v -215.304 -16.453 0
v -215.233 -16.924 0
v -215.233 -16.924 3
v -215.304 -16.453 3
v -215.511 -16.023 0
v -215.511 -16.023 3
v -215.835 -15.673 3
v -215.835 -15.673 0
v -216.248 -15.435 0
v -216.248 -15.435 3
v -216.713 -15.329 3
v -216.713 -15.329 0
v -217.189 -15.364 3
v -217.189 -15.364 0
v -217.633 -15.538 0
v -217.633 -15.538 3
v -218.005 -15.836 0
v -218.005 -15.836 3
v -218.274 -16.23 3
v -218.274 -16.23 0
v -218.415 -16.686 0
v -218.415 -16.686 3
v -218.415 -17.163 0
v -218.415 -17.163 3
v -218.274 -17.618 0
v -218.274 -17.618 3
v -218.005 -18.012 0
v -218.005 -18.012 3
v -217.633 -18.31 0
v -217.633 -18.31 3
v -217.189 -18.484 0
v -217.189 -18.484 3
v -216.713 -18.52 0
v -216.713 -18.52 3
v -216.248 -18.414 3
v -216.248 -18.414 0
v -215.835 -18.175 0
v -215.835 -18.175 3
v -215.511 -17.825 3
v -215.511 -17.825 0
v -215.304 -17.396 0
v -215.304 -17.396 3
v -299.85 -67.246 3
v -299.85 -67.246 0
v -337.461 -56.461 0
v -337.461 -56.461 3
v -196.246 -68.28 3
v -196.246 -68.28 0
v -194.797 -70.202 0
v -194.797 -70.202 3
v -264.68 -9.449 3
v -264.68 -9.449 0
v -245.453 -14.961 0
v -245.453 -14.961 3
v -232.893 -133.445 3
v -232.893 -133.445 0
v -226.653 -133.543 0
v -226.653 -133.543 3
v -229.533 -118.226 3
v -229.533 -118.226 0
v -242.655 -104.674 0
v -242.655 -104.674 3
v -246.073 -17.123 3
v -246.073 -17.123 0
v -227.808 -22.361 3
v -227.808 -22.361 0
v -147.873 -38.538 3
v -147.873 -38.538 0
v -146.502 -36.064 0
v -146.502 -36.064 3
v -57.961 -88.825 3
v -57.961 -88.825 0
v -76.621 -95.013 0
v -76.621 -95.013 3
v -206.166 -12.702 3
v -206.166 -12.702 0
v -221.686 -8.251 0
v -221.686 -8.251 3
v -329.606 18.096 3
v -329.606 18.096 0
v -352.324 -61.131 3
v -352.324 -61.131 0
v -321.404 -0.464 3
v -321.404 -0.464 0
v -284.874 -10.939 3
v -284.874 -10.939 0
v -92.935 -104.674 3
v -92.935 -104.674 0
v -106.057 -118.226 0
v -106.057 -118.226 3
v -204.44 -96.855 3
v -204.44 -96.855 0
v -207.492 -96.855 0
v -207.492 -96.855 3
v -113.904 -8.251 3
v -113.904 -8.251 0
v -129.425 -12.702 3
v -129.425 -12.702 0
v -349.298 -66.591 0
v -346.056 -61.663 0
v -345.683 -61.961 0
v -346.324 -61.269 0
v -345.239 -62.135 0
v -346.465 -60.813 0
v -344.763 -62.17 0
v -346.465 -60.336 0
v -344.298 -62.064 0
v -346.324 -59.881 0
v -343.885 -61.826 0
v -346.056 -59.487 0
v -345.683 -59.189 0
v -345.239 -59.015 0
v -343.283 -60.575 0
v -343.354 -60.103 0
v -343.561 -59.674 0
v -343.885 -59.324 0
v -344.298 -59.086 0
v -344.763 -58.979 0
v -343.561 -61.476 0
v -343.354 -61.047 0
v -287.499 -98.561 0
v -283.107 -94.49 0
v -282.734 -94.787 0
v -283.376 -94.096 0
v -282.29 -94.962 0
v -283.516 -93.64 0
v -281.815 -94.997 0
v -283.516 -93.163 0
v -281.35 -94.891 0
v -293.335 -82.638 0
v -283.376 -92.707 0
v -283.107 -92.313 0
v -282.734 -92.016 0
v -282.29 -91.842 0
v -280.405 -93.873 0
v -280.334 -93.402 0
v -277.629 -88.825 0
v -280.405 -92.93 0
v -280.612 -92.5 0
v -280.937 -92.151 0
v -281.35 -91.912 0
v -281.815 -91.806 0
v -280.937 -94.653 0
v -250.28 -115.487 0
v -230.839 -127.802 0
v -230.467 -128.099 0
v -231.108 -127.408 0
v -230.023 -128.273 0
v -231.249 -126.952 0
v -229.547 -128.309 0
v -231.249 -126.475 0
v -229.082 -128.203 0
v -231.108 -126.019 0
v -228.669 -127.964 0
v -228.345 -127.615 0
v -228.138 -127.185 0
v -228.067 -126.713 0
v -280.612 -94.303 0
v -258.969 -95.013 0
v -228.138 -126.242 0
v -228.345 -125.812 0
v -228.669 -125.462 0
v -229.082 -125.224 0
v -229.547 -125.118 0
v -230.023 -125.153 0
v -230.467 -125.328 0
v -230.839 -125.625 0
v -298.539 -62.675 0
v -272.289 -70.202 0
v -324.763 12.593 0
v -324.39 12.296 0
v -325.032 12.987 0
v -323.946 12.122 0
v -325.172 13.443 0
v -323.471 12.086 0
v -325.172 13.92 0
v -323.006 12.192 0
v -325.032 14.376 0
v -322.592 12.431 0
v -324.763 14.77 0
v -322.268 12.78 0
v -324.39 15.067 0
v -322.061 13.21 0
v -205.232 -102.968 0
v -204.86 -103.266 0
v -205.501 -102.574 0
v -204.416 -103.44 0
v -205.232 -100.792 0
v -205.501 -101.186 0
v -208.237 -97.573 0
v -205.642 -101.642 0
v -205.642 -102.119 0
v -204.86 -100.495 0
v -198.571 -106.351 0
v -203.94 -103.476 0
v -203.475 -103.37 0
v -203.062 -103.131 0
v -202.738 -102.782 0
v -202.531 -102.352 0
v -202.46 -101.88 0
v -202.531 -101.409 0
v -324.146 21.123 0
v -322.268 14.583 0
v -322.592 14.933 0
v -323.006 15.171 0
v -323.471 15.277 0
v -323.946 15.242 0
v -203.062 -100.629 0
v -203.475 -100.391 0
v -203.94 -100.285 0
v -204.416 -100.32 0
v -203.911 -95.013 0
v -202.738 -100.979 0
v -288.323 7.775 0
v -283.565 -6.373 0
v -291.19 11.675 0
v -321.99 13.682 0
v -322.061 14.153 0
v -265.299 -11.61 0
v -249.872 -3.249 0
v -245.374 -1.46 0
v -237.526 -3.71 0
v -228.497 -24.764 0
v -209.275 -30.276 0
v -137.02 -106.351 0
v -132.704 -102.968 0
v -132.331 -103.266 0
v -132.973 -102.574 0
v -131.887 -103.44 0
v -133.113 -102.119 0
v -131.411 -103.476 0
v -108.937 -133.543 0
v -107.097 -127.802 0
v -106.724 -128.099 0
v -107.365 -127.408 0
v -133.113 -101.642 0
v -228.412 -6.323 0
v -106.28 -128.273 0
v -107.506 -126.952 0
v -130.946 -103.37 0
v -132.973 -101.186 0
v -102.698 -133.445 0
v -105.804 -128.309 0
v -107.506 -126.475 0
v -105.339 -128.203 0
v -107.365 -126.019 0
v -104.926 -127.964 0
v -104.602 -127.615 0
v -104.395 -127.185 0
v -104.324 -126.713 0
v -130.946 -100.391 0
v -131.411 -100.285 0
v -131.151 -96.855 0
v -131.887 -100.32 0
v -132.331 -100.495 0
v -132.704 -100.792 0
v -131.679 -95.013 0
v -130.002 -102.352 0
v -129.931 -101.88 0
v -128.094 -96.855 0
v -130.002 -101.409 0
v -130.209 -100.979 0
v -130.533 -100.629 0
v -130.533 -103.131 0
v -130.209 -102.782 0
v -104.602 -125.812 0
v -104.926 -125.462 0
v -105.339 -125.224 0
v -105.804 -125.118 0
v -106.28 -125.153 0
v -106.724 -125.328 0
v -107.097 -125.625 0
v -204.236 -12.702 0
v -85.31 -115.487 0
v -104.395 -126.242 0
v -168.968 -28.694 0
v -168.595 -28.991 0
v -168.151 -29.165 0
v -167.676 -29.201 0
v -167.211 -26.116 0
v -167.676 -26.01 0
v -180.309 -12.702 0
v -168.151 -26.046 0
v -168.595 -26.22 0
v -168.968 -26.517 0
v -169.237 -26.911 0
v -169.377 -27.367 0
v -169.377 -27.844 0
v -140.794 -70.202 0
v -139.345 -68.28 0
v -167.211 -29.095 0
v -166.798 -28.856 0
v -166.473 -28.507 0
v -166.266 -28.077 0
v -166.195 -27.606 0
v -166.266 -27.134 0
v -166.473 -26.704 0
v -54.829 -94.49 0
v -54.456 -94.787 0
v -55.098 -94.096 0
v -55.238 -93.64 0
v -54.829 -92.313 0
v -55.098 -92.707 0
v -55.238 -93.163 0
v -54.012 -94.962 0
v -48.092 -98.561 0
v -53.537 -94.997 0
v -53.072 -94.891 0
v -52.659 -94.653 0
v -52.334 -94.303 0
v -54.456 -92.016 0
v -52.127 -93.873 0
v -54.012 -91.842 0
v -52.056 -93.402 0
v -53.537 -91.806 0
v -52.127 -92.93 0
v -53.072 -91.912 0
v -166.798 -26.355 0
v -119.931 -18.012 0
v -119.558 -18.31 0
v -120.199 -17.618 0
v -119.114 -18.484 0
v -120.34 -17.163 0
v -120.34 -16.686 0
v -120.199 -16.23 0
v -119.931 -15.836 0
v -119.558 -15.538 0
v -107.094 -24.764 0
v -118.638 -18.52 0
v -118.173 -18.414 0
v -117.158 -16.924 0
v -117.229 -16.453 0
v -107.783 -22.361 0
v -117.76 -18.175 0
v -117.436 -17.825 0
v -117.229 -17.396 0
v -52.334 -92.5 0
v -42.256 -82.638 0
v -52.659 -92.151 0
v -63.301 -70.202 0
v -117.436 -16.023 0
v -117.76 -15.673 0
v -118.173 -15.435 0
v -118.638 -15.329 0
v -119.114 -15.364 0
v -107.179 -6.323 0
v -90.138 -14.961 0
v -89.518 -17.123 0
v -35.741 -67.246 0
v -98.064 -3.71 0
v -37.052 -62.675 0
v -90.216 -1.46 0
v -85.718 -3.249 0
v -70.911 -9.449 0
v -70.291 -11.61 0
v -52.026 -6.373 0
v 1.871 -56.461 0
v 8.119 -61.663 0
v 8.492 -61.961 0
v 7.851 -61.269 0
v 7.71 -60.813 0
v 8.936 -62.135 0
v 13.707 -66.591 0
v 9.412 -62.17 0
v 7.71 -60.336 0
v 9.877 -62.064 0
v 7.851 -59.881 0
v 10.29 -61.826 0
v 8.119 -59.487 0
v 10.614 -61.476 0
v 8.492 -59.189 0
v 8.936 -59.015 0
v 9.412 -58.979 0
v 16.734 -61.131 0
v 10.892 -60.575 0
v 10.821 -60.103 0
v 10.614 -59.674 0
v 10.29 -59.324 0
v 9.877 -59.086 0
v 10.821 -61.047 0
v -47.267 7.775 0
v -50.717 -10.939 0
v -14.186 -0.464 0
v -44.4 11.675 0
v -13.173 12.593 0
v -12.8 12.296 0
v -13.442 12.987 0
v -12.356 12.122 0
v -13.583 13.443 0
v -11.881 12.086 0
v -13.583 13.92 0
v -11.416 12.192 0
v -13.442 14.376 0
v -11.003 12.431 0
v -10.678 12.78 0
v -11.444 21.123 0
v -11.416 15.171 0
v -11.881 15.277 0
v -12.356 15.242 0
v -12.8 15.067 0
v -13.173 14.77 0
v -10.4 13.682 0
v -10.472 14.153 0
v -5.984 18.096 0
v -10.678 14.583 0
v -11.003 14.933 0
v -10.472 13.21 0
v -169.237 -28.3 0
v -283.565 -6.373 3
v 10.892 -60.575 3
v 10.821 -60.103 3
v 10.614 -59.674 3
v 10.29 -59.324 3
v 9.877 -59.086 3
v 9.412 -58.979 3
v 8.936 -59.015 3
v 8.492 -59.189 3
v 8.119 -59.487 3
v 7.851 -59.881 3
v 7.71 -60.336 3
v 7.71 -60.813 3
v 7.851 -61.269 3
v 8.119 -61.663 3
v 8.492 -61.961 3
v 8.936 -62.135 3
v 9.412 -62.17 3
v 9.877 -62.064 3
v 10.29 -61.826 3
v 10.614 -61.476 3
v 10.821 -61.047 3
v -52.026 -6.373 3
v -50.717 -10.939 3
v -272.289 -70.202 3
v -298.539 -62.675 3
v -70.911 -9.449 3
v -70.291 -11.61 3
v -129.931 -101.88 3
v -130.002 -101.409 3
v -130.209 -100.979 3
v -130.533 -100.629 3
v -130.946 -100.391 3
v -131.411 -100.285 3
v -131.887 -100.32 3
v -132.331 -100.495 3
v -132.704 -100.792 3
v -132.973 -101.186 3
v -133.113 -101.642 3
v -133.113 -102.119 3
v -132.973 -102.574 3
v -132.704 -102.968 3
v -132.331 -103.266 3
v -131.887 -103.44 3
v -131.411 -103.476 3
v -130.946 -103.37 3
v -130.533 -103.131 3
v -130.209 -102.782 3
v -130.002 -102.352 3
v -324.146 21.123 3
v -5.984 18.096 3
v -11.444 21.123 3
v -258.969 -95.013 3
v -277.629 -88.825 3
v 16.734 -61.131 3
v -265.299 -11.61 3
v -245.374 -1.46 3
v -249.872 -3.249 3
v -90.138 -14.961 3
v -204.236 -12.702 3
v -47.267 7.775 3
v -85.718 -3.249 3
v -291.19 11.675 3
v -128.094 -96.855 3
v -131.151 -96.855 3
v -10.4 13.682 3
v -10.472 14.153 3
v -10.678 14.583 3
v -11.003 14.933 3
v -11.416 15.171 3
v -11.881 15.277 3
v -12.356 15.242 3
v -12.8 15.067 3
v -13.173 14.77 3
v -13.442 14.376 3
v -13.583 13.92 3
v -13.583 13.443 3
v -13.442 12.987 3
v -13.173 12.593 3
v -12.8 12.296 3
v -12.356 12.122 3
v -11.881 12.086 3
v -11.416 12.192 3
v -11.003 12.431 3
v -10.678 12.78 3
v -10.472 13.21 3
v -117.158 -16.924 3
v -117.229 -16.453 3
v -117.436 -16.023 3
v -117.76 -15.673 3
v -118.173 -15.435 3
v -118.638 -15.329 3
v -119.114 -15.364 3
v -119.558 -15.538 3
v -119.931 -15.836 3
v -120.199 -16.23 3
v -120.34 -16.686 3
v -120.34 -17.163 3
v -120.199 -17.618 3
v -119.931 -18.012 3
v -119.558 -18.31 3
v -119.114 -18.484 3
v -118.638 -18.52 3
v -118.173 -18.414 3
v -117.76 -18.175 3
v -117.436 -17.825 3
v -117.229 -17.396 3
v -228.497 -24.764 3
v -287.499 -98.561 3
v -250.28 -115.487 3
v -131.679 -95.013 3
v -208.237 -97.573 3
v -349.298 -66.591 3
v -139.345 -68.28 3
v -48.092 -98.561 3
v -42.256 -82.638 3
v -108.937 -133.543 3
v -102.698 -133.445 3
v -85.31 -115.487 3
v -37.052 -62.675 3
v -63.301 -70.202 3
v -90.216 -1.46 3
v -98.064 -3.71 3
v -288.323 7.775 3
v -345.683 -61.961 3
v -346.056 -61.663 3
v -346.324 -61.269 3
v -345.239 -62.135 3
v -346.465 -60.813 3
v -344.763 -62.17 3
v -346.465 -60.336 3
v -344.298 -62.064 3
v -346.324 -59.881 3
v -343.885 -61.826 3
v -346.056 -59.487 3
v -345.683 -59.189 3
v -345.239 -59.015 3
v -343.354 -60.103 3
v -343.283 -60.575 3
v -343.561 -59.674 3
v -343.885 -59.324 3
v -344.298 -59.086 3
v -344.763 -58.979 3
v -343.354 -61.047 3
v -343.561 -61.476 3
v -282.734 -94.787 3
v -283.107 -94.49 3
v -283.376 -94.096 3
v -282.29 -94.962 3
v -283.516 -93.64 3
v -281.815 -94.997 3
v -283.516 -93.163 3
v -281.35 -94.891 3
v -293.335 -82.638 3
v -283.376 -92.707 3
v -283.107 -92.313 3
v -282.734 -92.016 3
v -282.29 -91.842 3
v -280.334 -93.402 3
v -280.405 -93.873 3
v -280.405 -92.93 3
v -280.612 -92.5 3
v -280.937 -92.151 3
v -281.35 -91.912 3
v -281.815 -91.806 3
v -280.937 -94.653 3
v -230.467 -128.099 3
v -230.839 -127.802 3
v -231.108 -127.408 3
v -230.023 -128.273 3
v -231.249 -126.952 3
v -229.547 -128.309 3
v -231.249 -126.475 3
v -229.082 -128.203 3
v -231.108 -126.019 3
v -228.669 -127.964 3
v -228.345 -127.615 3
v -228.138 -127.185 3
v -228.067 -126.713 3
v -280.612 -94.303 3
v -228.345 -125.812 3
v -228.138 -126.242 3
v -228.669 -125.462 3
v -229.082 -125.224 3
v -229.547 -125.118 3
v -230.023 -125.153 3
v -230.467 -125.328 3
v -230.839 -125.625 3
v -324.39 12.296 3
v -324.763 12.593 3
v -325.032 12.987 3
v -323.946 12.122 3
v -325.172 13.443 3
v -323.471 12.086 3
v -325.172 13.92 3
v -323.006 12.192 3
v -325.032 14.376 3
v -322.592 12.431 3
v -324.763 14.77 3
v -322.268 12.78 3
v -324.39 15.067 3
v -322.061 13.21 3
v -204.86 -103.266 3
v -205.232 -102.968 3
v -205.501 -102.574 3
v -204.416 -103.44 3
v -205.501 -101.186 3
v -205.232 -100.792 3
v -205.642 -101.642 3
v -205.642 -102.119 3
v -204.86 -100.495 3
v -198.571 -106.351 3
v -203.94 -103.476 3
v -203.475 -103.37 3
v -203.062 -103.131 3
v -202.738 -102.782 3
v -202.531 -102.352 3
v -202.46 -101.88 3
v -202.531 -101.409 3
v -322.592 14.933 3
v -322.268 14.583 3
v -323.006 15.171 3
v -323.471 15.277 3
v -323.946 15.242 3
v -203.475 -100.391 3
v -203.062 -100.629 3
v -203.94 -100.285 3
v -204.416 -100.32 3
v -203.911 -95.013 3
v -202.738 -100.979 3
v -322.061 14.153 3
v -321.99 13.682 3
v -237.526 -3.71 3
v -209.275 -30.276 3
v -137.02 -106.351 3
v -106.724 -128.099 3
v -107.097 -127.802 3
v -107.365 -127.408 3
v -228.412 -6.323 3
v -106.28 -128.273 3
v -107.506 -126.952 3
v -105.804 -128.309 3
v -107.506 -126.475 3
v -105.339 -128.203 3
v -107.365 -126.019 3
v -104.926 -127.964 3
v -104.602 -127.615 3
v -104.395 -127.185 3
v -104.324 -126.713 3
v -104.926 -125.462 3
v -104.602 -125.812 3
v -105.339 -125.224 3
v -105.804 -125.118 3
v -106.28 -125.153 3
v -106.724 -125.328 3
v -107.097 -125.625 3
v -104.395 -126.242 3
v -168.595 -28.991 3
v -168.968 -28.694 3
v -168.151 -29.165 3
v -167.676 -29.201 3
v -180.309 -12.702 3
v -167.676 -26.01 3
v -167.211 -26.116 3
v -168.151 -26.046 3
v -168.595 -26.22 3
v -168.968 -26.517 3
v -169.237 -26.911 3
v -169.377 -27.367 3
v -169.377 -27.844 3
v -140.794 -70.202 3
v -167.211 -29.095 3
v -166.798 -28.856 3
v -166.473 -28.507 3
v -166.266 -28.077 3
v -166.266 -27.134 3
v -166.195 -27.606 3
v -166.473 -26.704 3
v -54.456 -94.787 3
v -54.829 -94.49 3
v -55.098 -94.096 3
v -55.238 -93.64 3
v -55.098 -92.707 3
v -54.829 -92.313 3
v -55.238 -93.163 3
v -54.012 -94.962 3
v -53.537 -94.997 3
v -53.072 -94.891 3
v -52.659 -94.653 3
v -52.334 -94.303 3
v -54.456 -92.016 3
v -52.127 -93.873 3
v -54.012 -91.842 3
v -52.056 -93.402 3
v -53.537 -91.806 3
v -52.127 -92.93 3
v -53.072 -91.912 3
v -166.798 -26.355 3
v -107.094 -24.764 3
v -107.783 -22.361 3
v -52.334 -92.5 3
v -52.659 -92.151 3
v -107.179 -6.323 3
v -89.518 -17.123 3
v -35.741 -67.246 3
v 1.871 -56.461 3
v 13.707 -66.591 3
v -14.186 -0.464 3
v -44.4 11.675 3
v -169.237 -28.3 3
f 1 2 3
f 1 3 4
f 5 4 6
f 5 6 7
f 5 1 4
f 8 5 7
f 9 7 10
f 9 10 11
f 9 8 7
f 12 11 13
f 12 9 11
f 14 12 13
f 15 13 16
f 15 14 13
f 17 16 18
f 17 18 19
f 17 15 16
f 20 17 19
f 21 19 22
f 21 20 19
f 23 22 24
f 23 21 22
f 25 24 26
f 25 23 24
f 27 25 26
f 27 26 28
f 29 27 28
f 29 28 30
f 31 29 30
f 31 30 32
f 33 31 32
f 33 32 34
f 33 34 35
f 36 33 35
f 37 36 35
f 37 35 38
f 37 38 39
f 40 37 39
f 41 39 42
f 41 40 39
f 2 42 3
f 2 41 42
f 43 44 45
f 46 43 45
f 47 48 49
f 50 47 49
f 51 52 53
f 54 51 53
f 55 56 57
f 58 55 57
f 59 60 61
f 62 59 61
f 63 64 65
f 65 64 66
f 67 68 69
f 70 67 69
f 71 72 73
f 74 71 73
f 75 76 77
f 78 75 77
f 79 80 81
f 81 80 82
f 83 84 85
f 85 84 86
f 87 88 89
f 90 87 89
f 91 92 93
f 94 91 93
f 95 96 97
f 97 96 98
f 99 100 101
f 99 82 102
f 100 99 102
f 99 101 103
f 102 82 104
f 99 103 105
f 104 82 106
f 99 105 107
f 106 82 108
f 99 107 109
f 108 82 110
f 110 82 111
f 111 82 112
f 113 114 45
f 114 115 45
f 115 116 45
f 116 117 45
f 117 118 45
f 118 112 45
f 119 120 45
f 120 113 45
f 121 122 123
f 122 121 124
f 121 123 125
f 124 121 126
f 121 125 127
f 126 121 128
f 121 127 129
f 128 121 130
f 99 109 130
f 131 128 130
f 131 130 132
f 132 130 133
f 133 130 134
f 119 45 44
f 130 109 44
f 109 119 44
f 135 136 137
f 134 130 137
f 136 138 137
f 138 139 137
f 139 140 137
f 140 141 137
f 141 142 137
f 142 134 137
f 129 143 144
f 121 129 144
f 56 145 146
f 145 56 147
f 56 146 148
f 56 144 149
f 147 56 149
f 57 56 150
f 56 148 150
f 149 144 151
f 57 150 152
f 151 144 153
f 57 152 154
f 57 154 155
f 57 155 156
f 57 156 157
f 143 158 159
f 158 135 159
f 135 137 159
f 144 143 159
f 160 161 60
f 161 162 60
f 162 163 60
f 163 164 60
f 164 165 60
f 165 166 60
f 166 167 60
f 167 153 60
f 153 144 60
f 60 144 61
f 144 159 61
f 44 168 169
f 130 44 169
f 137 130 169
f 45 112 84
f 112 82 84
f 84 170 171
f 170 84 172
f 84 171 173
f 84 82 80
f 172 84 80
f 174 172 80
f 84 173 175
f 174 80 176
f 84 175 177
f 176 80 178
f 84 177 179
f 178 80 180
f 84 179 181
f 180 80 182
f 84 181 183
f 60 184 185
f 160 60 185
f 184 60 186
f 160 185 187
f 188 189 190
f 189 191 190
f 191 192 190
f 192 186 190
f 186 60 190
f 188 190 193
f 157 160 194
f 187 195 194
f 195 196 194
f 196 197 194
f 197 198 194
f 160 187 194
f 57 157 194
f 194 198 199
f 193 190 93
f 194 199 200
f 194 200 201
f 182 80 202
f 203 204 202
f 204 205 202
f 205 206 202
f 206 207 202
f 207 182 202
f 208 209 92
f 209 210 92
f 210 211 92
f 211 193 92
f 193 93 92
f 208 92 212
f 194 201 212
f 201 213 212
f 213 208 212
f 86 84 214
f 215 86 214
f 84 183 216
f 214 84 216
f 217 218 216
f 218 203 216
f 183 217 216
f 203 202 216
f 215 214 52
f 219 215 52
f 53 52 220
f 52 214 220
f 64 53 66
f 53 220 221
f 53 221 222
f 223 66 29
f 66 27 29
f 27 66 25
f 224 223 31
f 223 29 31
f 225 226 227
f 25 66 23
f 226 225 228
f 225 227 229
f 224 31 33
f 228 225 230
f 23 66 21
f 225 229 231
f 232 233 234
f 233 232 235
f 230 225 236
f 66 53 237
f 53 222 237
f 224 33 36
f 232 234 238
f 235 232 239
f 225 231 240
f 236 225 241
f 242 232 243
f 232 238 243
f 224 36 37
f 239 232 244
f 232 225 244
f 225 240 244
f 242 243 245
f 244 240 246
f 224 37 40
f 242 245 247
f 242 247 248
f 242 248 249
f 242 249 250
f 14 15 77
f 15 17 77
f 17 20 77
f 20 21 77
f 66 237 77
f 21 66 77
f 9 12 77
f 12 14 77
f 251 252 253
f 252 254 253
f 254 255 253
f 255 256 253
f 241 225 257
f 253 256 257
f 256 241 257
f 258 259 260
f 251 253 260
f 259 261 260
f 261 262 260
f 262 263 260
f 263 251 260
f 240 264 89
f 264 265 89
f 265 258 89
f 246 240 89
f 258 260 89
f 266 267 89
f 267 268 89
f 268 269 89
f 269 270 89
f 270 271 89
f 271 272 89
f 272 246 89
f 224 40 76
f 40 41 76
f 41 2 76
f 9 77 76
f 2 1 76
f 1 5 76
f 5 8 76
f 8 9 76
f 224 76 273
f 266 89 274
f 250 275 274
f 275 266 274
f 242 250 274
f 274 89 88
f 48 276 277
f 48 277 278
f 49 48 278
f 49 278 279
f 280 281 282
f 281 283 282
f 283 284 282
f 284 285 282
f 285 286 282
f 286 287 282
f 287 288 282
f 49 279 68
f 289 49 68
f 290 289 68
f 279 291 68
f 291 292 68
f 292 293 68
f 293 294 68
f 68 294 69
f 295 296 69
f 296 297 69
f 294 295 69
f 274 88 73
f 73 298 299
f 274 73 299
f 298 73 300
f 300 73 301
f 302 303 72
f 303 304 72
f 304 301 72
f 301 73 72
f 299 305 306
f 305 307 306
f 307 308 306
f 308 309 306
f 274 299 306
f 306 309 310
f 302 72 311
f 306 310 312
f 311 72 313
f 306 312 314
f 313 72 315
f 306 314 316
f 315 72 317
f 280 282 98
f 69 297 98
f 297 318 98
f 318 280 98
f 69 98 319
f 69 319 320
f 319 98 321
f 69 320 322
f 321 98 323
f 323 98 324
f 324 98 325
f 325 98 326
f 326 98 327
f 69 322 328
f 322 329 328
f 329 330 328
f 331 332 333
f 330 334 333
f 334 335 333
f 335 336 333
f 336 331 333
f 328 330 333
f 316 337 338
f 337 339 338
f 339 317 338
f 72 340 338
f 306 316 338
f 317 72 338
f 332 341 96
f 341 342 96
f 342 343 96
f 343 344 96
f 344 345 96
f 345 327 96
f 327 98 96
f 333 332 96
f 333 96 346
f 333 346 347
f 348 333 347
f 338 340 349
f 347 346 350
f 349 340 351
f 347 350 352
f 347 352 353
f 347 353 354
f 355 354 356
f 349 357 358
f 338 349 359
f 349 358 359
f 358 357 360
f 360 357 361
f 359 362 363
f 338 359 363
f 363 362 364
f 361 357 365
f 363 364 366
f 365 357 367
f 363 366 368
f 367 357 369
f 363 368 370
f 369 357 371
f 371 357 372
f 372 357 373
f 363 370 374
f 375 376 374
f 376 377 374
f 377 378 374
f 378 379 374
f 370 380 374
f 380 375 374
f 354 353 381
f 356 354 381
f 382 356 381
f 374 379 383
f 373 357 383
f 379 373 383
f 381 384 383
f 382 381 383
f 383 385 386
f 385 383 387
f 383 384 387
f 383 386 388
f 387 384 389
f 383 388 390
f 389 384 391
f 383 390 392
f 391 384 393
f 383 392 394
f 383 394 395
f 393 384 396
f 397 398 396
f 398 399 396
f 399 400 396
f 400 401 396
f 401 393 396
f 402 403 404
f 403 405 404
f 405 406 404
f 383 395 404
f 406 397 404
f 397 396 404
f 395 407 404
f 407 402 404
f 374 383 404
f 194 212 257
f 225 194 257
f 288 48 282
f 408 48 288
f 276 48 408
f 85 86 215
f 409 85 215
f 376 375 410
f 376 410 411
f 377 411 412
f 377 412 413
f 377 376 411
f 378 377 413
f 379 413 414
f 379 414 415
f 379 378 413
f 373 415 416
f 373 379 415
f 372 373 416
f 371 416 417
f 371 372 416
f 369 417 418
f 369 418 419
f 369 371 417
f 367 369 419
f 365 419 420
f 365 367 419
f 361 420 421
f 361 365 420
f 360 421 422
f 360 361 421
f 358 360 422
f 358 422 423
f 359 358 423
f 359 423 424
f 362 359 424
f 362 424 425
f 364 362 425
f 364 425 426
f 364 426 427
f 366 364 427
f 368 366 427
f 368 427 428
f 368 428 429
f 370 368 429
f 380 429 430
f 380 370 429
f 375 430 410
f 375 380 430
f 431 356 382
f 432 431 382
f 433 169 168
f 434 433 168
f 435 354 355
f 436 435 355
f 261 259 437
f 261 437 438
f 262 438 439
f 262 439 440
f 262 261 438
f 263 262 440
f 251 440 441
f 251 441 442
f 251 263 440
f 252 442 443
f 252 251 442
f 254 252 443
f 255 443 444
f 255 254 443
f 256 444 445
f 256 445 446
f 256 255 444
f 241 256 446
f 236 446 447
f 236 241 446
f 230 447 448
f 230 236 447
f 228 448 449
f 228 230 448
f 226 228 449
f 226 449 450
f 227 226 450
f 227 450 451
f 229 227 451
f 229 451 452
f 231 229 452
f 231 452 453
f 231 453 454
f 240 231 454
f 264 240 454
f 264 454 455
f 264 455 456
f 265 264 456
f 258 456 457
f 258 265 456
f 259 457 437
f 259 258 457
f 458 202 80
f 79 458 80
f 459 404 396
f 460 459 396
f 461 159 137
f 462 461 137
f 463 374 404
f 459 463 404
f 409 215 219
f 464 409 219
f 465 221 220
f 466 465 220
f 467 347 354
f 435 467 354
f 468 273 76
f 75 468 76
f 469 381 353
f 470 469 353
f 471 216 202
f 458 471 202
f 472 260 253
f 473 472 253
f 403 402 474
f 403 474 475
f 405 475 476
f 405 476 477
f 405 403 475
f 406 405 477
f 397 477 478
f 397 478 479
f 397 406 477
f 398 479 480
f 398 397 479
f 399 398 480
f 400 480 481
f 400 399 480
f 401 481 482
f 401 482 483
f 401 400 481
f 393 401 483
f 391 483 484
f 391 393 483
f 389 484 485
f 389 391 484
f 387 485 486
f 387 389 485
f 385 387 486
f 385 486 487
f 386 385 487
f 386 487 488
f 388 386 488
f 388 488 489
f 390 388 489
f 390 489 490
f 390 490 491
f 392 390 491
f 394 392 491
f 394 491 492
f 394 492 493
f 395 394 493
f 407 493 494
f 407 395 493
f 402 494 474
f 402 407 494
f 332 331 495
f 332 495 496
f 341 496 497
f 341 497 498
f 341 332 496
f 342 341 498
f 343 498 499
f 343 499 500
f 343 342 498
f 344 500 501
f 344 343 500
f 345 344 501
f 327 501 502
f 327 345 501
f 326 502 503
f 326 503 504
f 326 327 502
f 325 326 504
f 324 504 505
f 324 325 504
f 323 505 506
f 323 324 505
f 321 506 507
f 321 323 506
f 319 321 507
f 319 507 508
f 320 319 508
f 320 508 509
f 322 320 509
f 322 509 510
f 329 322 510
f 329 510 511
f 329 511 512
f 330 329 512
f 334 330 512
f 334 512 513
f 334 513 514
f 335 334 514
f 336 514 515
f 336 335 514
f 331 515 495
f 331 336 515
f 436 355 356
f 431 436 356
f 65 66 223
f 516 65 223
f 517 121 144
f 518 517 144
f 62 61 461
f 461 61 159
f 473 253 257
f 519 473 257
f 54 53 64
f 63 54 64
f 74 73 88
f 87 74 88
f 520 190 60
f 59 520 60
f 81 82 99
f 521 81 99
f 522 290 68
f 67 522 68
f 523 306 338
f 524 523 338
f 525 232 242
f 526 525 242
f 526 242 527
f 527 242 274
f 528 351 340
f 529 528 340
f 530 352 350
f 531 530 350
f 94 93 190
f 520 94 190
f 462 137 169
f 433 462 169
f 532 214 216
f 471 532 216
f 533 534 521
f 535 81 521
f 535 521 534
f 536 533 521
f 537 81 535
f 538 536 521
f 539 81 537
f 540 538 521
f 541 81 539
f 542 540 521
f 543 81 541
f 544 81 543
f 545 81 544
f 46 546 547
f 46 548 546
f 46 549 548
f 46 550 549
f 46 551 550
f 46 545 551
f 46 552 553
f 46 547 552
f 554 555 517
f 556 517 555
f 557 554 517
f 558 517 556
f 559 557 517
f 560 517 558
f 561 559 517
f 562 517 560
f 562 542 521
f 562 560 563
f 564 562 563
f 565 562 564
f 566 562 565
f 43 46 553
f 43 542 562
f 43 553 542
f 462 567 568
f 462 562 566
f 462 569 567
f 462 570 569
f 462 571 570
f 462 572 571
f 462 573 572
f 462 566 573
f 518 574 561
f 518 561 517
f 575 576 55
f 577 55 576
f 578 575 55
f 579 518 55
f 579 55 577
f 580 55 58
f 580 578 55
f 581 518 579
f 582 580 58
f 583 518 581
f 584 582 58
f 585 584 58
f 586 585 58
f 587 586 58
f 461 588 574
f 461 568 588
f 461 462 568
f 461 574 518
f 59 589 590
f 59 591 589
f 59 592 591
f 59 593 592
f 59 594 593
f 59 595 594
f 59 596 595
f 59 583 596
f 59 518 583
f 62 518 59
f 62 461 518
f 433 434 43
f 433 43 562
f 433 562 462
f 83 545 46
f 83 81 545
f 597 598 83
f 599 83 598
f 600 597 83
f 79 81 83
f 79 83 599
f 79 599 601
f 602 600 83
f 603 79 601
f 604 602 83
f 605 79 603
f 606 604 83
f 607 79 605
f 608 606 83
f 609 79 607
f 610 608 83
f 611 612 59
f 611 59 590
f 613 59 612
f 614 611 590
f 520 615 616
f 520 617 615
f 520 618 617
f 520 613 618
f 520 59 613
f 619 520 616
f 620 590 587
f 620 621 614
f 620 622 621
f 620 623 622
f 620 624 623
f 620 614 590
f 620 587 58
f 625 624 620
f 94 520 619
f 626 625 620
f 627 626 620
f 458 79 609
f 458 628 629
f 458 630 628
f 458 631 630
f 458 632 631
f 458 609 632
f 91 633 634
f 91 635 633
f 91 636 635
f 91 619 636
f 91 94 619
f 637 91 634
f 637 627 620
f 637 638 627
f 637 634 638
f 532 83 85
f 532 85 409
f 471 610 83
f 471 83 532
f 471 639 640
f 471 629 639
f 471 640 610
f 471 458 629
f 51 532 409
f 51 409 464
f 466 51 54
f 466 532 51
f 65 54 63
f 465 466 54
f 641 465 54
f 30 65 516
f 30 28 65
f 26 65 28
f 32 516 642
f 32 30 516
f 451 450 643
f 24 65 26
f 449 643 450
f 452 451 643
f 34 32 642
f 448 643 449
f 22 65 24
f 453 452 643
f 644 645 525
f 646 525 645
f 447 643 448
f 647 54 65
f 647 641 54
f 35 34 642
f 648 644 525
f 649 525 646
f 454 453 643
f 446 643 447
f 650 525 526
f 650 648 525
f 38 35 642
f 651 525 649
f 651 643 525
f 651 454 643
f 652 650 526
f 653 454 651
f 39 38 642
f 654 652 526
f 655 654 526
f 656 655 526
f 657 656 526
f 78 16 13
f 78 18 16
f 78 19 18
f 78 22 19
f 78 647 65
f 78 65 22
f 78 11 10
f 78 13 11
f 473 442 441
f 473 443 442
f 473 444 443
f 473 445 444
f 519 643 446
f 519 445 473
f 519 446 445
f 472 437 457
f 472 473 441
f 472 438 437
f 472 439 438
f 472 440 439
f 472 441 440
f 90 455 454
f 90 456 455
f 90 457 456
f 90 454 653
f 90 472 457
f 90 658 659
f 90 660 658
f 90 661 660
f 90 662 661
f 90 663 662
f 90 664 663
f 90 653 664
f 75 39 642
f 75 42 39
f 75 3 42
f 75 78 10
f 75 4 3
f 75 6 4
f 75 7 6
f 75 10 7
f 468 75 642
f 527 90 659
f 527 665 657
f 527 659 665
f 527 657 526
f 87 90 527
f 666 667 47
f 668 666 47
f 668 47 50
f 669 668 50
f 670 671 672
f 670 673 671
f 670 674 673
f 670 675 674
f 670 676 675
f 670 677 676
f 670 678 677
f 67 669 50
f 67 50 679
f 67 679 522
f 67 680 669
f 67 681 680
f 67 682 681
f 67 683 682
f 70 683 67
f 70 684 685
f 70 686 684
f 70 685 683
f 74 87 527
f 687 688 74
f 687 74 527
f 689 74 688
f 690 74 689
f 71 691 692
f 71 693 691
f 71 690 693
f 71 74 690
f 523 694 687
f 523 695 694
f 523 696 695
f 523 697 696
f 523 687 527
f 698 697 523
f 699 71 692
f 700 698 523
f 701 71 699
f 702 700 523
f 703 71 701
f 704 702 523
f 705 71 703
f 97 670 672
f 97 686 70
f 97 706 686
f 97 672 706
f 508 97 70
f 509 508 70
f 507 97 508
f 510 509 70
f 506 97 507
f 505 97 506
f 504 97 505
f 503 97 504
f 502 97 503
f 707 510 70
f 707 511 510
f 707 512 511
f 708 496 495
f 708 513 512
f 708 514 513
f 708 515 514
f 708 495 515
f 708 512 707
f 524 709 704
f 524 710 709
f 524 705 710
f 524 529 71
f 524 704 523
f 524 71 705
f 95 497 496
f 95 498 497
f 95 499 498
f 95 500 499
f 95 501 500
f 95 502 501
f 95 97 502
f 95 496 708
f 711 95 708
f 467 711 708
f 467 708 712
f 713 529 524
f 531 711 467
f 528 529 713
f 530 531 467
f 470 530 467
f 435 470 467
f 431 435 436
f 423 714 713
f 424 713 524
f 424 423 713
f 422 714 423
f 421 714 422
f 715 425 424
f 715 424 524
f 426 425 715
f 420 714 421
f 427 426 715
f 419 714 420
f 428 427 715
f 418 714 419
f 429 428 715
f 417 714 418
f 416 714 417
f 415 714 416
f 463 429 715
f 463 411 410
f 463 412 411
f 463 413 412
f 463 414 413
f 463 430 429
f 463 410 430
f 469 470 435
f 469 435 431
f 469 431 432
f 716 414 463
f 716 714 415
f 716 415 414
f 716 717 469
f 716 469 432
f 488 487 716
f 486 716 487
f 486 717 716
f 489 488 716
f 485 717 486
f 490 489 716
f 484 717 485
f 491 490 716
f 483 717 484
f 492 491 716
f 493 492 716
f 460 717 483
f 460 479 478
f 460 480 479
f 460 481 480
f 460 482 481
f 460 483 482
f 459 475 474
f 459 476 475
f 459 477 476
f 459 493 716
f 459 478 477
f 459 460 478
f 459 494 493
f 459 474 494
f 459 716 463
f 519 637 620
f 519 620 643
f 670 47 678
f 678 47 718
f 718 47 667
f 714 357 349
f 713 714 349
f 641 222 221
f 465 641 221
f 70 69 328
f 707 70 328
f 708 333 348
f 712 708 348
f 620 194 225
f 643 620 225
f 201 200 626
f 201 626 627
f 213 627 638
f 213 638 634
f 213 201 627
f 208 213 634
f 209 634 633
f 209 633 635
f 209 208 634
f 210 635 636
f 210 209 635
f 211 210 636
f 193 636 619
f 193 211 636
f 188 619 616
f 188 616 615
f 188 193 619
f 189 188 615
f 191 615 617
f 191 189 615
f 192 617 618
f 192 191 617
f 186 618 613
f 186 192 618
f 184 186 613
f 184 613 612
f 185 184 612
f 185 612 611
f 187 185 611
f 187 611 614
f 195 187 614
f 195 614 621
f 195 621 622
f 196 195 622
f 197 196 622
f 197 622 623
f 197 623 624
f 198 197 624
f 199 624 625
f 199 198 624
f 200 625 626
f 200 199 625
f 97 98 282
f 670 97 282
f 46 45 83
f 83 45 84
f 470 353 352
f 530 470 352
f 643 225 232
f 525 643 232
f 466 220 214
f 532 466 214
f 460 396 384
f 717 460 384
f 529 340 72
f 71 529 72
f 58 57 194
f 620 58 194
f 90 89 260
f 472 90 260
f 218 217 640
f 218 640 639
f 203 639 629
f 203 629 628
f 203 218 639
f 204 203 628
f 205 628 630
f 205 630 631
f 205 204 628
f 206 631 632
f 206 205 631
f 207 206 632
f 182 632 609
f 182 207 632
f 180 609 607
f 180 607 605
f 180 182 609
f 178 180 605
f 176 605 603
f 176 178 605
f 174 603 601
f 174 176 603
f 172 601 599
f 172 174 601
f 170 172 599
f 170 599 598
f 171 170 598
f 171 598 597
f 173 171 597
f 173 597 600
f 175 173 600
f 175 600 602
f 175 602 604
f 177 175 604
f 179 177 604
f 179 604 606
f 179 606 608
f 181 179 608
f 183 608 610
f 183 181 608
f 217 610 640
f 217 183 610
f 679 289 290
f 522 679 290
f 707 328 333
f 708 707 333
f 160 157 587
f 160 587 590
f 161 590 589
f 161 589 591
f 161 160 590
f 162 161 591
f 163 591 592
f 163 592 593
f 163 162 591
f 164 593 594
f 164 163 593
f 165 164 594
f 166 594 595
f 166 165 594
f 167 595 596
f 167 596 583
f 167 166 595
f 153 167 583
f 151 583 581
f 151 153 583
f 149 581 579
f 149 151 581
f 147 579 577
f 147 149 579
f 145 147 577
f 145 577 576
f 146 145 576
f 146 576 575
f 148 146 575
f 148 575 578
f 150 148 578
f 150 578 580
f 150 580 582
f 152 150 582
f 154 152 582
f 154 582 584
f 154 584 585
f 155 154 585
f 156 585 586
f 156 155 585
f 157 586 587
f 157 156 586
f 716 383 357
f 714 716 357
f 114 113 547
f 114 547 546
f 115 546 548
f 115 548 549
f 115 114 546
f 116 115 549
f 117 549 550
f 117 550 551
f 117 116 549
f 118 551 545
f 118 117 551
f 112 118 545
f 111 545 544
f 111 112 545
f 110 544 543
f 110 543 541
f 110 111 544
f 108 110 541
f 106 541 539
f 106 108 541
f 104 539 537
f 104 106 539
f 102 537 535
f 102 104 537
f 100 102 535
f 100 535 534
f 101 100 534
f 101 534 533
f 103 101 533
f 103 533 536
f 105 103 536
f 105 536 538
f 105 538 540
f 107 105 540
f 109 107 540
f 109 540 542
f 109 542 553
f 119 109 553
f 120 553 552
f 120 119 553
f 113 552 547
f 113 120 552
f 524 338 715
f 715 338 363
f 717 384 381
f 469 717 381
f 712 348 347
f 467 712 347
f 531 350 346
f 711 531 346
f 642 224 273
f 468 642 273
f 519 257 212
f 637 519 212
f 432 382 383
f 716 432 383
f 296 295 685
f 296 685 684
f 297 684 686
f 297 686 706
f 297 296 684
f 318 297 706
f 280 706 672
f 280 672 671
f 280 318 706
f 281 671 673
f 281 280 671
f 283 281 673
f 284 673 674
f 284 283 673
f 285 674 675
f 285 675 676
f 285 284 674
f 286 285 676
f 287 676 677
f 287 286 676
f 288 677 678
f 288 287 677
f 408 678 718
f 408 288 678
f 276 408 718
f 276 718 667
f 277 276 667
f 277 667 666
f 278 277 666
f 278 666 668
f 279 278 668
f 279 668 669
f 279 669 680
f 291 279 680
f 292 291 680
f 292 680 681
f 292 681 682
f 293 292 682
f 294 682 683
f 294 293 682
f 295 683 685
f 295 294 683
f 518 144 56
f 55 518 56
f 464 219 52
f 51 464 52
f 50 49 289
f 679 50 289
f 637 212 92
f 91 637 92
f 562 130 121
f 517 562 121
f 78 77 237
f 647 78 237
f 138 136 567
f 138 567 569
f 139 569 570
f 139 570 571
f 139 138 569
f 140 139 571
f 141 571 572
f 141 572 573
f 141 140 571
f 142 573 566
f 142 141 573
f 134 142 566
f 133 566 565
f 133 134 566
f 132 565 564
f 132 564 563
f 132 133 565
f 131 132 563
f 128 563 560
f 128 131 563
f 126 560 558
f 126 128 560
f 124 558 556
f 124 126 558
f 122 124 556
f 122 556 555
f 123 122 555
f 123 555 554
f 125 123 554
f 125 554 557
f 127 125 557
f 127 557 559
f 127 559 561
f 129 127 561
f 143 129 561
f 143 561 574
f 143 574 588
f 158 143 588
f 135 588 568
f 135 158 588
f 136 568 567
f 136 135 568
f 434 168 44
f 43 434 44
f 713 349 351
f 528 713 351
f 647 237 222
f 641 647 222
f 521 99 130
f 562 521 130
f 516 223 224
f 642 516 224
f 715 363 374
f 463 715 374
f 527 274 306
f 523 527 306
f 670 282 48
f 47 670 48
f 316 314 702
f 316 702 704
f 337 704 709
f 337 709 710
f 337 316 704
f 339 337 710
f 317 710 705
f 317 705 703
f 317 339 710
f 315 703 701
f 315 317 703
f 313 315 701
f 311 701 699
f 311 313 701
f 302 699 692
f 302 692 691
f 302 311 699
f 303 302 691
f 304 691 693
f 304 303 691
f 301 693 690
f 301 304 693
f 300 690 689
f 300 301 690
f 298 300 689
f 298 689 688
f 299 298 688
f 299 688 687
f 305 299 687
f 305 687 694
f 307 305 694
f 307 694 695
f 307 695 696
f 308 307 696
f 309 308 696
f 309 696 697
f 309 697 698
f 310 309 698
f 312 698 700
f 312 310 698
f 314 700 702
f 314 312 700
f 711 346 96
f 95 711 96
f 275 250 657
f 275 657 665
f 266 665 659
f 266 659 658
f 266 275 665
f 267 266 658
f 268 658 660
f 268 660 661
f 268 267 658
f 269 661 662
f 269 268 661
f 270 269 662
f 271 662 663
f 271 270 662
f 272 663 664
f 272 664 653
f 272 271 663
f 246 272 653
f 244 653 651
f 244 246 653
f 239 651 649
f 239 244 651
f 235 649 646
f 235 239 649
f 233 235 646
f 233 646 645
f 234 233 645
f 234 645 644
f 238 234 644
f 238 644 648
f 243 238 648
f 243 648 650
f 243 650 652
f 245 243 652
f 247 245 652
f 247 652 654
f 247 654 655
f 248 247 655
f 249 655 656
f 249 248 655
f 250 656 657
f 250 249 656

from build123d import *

# Parameters (mm, degrees)
ESQUISSE1_R        = 1.6
BOSS_EXTRU_1_DEPTH = 3


with BuildPart() as part:
    # Esquisse1 → Boss.-Extru.1 (new body)
    with BuildSketch(Plane.XY):
        Polygon((-106.057456456, -118.225792128), (-128.094157446, -96.85509979), (-131.150893181, -96.85509979), (-131.679198628, -95.012679745), (-203.911321115, -95.012679745), (-204.439626562, -96.85509979), (-207.491865187, -96.85509979), (-208.236606037, -97.572971364), (-229.533063287, -118.225792128), (-242.655085998, -104.673746846), (-258.969310369, -95.012679745), (-277.629290011, -88.825419148), (-272.289144354, -70.202118055), (-298.538981418, -62.6750984), (-299.849714513, -67.246167925), (-337.461409717, -56.461187875), (-321.404434006, -0.463858857), (-284.873898651, -10.938821309), (-283.564528345, -6.372504389), (-265.299260667, -11.609985616), (-264.679553884, -9.448811229), (-245.452786066, -14.960840928), (-246.072799476, -17.123084647), (-227.807531798, -22.360565873), (-228.496674065, -24.763890567), (-209.275142378, -30.275576085), (-204.23586614, -12.701531345), (-206.165691337, -12.701531345), (-221.686141291, -8.251113935), (-228.411595336, -6.322621021), (-237.526398495, -3.709541892), (-245.374022141, -1.459744369), (-249.872259625, -3.248768002), (-288.323340616, 7.774587685), (-291.190458161, 11.675149567), (-324.146226634, 21.123080509), (-329.606279511, 18.096325283), (-352.324375235, -61.131089881), (-349.297882974, -66.591026451), (-293.334748244, -82.638197107), (-287.498708924, -98.561018129), (-250.280154874, -115.48724507), (-232.892593163, -133.444615579), (-226.653475651, -133.542771169), (-198.570548361, -106.350948678), (-137.019971382, -106.350948678), (-108.937044092, -133.542771169), (-102.69792658, -133.444615579), (-85.310364869, -115.48724507), (-48.091810819, -98.561018129), (-42.255771499, -82.638197107), (13.707363231, -66.591026451), (16.733855492, -61.131089881), (-5.984240232, 18.096325283), (-11.444293109, 21.123080509), (-44.400061582, 11.675149567), (-47.267179127, 7.774587685), (-85.718260118, -3.248768002), (-90.216497602, -1.459744369), (-98.064121248, -3.709541892), (-107.178924407, -6.322621021), (-113.904378452, -8.251113935), (-129.424828406, -12.701531345), (-180.308979115, -12.701531345), (-196.245732321, -68.279594663), (-194.797007033, -70.202118055), (-140.79351271, -70.202118055), (-139.344787422, -68.279594663), (-147.87312166, -38.537758661), (-146.501872979, -36.063960558), (-107.093845678, -24.763890567), (-107.782987945, -22.360565873), (-89.517720268, -17.123084647), (-90.137733677, -14.960840928), (-70.910965859, -9.448811229), (-70.291259076, -11.609985616), (-52.025991399, -6.372504389), (-50.716621092, -10.938821309), (-14.186085737, -0.463858857), (1.870889973, -56.461187875), (-35.740805231, -67.246167925), (-37.051538325, -62.6750984), (-63.301375389, -70.202118055), (-57.961229733, -88.825419148), (-76.621209374, -95.012679745), (-92.935433745, -104.673746846), align=None)
        with Locations((-229.666591606, -126.713325795)):
            Circle(ESQUISSE1_R, mode=Mode.SUBTRACT)
        with Locations((-204.059552706, -101.880200807)):
            Circle(ESQUISSE1_R, mode=Mode.SUBTRACT)
        with Locations((-281.934339477, -93.401689518)):
            Circle(ESQUISSE1_R, mode=Mode.SUBTRACT)
        with Locations((-344.882804027, -60.574933915)):
            Circle(ESQUISSE1_R, mode=Mode.SUBTRACT)
        with Locations((-105.923928137, -126.713325795)):
            Circle(ESQUISSE1_R, mode=Mode.SUBTRACT)
        with Locations((-131.530967037, -101.880200807)):
            Circle(ESQUISSE1_R, mode=Mode.SUBTRACT)
        with Locations((-53.656180266, -93.401689518)):
            Circle(ESQUISSE1_R, mode=Mode.SUBTRACT)
        with Locations((9.292284284, -60.574933915)):
            Circle(ESQUISSE1_R, mode=Mode.SUBTRACT)
        with Locations((-167.795259872, -27.605548894)):
            Circle(ESQUISSE1_R, mode=Mode.SUBTRACT)
        with Locations((-323.590068827, 13.68165837)):
            Circle(ESQUISSE1_R, mode=Mode.SUBTRACT)
        with Locations((-216.832585966, -16.924131519)):
            Circle(ESQUISSE1_R, mode=Mode.SUBTRACT)
        with Locations((-118.757933777, -16.924131519)):
            Circle(ESQUISSE1_R, mode=Mode.SUBTRACT)
        with Locations((-12.000450916, 13.68165837)):
            Circle(ESQUISSE1_R, mode=Mode.SUBTRACT)
    extrude(amount=BOSS_EXTRU_1_DEPTH)


solid = part.part
